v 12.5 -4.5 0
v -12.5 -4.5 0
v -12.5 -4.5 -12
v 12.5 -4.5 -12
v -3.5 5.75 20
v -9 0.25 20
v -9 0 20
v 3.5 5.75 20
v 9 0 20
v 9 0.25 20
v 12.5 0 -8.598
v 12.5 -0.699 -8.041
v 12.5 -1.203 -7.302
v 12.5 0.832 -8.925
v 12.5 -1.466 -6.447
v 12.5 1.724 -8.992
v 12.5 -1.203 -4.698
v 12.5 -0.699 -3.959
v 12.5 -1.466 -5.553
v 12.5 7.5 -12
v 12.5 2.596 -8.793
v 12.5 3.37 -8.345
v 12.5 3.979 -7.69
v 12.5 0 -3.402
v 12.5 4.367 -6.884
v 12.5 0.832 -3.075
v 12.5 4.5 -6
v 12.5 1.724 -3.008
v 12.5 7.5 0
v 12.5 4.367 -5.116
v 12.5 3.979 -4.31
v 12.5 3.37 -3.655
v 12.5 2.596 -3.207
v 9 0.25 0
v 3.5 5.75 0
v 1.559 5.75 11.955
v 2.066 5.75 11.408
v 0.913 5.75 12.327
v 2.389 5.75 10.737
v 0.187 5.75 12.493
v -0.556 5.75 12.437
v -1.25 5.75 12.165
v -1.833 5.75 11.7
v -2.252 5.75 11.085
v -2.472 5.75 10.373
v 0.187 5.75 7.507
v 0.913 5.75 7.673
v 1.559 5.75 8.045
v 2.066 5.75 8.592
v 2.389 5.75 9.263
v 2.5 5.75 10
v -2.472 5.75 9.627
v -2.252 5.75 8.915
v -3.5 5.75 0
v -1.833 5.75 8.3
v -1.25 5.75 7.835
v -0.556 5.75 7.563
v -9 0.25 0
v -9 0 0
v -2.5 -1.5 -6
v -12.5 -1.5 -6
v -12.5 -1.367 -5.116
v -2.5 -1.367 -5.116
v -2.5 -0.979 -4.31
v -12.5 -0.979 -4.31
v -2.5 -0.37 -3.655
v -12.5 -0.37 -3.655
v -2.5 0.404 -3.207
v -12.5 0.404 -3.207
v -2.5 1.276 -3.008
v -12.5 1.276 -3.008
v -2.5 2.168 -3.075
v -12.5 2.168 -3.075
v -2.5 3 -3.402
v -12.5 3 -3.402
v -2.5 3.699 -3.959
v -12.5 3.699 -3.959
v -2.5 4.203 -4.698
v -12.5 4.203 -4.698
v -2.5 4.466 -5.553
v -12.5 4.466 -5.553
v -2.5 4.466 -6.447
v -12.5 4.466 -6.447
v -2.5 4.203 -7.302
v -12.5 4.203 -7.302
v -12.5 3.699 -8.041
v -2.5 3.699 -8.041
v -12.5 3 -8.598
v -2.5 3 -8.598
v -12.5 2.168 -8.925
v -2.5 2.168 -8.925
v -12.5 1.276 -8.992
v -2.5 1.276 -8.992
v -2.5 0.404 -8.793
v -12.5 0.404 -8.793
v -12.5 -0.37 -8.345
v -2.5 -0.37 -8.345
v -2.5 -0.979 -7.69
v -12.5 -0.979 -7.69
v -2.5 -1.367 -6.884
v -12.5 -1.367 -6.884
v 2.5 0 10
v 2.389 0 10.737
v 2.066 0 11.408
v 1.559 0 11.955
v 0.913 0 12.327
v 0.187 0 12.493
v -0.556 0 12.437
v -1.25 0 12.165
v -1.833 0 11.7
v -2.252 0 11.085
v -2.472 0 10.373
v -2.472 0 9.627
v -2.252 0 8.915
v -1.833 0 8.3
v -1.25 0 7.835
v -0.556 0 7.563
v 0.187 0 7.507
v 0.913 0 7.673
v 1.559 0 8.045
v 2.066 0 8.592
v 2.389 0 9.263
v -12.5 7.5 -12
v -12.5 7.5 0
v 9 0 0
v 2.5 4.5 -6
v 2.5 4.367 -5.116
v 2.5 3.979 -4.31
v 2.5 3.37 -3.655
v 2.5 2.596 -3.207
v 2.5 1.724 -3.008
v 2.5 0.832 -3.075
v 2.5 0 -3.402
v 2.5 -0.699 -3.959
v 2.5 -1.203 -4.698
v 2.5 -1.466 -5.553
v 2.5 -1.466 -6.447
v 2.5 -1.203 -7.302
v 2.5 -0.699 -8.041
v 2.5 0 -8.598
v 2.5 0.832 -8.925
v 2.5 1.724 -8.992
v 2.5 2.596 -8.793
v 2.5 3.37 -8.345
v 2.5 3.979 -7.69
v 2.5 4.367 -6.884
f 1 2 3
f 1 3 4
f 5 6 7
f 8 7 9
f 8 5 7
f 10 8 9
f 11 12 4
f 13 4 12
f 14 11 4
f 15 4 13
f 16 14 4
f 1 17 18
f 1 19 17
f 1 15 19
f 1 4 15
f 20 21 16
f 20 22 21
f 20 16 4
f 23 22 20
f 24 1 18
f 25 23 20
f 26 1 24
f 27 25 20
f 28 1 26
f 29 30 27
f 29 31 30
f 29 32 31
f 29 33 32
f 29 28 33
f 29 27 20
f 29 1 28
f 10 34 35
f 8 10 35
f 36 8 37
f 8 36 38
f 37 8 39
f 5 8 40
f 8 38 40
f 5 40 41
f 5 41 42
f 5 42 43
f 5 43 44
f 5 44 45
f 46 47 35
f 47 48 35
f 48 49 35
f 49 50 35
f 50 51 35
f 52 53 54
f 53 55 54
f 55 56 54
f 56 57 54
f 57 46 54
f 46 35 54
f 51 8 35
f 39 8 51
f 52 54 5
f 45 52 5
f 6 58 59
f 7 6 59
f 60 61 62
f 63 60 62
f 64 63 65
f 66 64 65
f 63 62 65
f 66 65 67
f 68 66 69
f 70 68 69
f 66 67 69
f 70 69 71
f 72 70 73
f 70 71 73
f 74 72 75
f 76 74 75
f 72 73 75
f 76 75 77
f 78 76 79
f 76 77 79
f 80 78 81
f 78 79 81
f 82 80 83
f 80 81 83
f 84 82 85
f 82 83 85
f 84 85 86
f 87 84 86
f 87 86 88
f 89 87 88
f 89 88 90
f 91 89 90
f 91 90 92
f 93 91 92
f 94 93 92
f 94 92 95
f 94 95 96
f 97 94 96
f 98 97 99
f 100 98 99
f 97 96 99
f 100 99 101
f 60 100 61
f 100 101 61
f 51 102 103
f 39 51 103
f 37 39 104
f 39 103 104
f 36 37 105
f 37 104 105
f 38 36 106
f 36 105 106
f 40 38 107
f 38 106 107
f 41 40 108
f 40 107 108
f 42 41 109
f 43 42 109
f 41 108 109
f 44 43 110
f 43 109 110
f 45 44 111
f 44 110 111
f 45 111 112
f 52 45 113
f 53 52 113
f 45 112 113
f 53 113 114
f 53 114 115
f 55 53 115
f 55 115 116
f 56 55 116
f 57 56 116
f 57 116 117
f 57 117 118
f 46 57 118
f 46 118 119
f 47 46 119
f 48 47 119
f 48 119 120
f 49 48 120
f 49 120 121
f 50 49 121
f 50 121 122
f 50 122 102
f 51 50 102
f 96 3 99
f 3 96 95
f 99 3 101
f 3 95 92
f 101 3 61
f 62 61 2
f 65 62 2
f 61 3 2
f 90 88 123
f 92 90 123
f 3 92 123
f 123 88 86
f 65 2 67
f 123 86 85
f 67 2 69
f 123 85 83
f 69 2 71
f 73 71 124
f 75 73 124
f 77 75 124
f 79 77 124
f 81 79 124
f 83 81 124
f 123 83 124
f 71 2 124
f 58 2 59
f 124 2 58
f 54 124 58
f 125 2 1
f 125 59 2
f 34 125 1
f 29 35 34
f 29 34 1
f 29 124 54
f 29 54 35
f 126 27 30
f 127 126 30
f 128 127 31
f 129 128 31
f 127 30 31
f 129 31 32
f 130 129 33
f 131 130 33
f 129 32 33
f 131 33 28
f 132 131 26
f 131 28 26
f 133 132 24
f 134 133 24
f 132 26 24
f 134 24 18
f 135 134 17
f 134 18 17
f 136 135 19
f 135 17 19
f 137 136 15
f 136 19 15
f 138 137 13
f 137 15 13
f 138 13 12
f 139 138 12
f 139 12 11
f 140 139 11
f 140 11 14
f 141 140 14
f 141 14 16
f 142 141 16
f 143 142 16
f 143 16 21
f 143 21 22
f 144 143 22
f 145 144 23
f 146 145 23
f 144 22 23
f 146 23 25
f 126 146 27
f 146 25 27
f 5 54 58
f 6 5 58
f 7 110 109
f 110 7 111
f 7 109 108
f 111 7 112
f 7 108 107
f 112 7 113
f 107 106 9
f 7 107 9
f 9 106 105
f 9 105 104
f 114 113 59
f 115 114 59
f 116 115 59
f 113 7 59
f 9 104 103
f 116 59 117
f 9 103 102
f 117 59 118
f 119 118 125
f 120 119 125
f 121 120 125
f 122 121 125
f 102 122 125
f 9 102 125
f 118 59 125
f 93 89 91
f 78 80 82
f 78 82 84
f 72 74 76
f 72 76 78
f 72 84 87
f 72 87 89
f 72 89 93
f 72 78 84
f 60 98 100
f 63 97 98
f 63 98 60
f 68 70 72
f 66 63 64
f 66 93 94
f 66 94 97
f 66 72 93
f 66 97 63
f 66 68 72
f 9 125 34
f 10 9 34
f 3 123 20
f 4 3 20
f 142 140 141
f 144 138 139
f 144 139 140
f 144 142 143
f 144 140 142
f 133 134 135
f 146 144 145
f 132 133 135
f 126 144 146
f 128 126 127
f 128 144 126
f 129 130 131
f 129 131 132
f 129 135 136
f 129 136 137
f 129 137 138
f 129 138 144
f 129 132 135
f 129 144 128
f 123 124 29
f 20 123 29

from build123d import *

# Parameters (mm, degrees)
F1_DEPTH = 20
F2_W     = 25
F2_H     = 12
F3_DEPTH = 12
F4_R     = 3
F5_DEPTH = 10
F6_R     = 3
F7_DEPTH = 10
F8_R     = 2.5
F9_DEPTH = 25


with BuildPart() as f1:
    # F0 (on Top) → F1 (new body)
    with BuildSketch(Plane.XY):
        Polygon((-9, 0), (0, 0), (9, 0), (9, 0.249999), (3.5, 5.749999), (0, 5.749999), (-3.5, 5.749999), (-9, 0.249999), align=None)
    extrude(amount=F1_DEPTH)

    # F2 (on Top) → F3 (join)
    with BuildSketch(Plane.XY):
        with Locations((0, 1.5)):
            Rectangle(F2_W, F2_H)
    extrude(amount=-F3_DEPTH)

    # F4 (on face) → F5 (cut)
    with BuildSketch(Plane.YZ.offset(12.5)):
        with Locations((1.5, -6)):
            Circle(F4_R)
    extrude(amount=-F5_DEPTH, mode=Mode.SUBTRACT)

    # F6 (on face) → F7 (cut)
    with BuildSketch(Plane(origin=(-12.5, 0, 0), x_dir=(0, -1, 0), z_dir=(-1, 0, 0))):
        with Locations((-1.5, -6)):
            Circle(F6_R)
    extrude(amount=-F7_DEPTH, mode=Mode.SUBTRACT)

    # F8 (on face) → F9 (cut)
    with BuildSketch(Plane.XZ):
        with Locations((0, 10)):
            Circle(F8_R)
    extrude(amount=-F9_DEPTH, mode=Mode.SUBTRACT)


solid = f1.part
